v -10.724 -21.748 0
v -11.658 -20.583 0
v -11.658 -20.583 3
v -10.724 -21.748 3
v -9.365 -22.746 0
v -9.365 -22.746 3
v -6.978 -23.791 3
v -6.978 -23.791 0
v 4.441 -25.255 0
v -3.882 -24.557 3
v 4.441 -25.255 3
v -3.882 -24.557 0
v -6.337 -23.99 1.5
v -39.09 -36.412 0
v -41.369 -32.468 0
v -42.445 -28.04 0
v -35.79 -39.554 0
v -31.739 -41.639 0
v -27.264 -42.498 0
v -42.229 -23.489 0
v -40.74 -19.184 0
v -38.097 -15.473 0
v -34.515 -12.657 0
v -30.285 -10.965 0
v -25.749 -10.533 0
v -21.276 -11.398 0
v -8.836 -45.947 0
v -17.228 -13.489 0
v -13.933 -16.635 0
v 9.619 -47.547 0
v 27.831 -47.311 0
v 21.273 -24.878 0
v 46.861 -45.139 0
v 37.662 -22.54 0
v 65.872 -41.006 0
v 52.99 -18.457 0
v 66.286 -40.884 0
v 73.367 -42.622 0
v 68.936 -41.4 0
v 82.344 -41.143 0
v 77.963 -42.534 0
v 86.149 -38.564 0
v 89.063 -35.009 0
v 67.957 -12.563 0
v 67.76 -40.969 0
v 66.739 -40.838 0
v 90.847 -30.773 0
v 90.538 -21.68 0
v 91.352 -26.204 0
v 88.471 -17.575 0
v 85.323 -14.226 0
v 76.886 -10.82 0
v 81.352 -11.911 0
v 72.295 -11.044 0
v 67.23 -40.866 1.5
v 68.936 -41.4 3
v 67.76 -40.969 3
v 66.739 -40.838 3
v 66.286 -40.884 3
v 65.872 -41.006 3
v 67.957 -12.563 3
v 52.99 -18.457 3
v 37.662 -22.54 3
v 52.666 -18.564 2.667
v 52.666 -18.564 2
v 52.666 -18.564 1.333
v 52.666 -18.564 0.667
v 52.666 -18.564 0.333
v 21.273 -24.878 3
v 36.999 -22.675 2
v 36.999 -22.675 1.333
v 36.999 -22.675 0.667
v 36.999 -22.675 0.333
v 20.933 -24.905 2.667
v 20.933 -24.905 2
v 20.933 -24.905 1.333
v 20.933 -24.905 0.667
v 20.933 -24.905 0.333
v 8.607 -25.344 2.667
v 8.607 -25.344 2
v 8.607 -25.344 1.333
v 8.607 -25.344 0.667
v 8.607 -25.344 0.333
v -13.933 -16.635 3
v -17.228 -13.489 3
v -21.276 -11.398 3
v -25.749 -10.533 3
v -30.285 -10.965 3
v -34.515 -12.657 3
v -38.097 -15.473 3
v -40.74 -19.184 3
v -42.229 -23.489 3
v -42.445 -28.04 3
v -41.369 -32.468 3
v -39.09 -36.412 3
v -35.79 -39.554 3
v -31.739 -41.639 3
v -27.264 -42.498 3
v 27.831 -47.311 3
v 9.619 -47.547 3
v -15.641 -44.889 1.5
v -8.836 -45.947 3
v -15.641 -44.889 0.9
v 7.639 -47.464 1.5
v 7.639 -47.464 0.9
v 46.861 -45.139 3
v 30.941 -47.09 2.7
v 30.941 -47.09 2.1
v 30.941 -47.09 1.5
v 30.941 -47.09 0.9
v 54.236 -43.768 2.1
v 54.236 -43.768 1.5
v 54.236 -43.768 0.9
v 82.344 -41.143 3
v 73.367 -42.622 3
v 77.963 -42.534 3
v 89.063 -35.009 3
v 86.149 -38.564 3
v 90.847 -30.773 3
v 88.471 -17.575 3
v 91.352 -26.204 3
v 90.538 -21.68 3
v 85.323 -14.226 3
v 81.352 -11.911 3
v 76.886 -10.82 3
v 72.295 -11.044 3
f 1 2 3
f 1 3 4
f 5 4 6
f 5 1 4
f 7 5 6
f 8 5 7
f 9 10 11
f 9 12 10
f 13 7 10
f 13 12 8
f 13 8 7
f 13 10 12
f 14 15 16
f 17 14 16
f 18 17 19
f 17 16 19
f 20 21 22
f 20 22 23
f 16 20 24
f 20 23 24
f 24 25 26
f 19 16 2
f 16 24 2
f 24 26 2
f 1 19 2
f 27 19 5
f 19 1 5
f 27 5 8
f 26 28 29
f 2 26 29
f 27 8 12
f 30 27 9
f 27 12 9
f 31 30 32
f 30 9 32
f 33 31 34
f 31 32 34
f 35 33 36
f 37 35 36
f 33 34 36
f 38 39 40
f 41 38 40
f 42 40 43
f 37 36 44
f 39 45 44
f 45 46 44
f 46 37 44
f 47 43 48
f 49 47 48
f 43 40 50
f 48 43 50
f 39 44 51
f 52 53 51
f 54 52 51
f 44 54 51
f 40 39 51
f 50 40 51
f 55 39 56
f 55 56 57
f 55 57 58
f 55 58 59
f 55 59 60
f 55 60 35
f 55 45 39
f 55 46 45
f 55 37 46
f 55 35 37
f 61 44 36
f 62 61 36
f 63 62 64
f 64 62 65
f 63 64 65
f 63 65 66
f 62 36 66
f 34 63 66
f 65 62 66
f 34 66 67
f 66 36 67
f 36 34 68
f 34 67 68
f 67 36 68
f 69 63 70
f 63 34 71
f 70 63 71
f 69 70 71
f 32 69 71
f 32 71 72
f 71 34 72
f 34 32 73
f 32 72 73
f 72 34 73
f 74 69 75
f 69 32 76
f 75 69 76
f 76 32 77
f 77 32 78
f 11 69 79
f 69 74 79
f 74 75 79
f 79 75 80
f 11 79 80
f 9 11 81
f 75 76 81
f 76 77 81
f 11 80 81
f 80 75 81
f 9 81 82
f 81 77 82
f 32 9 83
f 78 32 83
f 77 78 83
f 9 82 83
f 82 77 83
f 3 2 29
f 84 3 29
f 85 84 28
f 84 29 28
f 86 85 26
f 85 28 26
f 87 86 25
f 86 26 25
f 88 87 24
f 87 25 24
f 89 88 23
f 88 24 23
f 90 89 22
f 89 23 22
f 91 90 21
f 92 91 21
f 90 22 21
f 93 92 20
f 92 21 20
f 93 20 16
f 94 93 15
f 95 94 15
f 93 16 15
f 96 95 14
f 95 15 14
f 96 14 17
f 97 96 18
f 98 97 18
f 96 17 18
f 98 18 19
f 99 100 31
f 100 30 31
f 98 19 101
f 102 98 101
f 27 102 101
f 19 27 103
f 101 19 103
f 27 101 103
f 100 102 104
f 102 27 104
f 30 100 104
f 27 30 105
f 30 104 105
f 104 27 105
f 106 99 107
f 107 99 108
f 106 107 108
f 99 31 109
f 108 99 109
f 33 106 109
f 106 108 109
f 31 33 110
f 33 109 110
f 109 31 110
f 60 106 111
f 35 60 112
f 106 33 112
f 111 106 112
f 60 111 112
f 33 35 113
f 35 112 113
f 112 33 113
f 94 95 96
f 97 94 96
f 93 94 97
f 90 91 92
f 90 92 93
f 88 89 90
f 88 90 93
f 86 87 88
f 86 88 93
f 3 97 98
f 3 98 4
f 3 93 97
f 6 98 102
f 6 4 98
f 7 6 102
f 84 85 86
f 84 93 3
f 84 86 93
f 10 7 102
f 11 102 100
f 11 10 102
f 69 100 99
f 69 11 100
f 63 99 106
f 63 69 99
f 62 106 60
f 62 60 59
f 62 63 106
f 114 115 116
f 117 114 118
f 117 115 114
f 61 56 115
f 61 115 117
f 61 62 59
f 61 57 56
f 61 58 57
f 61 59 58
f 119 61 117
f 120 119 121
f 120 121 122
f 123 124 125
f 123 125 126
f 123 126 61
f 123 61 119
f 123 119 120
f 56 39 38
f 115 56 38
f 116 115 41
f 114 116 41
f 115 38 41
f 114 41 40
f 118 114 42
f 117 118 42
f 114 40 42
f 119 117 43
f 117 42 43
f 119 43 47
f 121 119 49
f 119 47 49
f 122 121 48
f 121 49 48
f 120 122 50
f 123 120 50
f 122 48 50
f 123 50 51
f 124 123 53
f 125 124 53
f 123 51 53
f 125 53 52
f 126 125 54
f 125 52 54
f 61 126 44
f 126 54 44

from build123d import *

# Parameters (mm, degrees)
SKETCH1_R           = 5
SKETCH1_R_2         = 1.1
SKETCH1_R_3         = 4
BOSS_EXTRUDE1_DEPTH = 3


with BuildPart() as part:
    # Sketch1 → Boss-Extrude1 (new body)
    # profile 1 of 19: a face of its own
    with BuildSketch(Plane.XY):
        with BuildLine():
            ThreePointArc((68.935876888, -41.399946265), (91.352405248, -26.204284986), (67.957252813, -12.563327983))
            add(Edge.make_bspline(
                [(67.957252813, -12.563327983), (65.455609859, -13.713888582), (60.364787712, -15.882927404), (52.683559955, -18.641296662), (44.896066709, -20.933273776), (37.015370972, -22.752952432), (29.033864031, -24.103049266), (20.950849492, -24.983508442), (14.12359191, -25.325141054), (8.614596461, -25.364124484), (5.82883012, -25.303122311), (4.440642397, -25.254725163)],
                knots=[0.003418543, 0.003418543, 0.003418543, 0.003418543, 0.119867337, 0.236316132, 0.352764926, 0.46921372, 0.585662514, 0.702111309, 0.818560103, 0.8767845, 0.935008897, 0.935008897, 0.935008897, 0.935008897], degree=3))
            add(Edge.make_bspline(
                [(-11.658277887, -20.5832063), (-9.065688302, -25.060046308), (4.440642397, -25.254725163)],
                knots=[0, 0, 0, 1, 1, 1], degree=2))
            ThreePointArc((-11.658277887, -20.5832063), (-39.551034339, -17.233624375), (-27.264419704, -42.497524754))
            add(Edge.make_bspline(
                [(-27.264419704, -42.497524754), (-25.334460253, -42.955768201), (-21.452320642, -43.816124737), (-13.705385842, -45.286858174), (-4.006421964, -46.667533574), (7.638269658, -47.586831656), (19.289241844, -47.768762722), (30.941925955, -47.212824411), (42.591601286, -45.920000504), (52.298162816, -44.228522597), (60.052175742, -42.510146288), (63.940283625, -41.52535362), (65.871739475, -41.00572578)],
                knots=[0.004189422, 0.004189422, 0.004189422, 0.004189422, 0.066427583, 0.128665745, 0.253142067, 0.377618389, 0.502094711, 0.626571033, 0.751047356, 0.875523678, 0.937761839, 1, 1, 1, 1], degree=3))
            add(Edge.make_bspline(
                [(68.935876888, -41.399946265), (67.056778784, -40.529280178), (65.871739475, -41.00572578)],
                knots=[0, 0, 0, 1, 1, 1], degree=2))
        make_face()
        with Locations((75.361610976, -26.74696222)):
            Circle(SKETCH1_R, mode=Mode.SUBTRACT)
        with Locations((75.361610976, -18.74696222)):
            Circle(SKETCH1_R_2, mode=Mode.SUBTRACT)
        with Locations((81.018465226, -21.090107971)):
            Circle(SKETCH1_R_2, mode=Mode.SUBTRACT)
        with Locations((83.361610976, -26.74696222)):
            Circle(SKETCH1_R_2, mode=Mode.SUBTRACT)
        with Locations((-26.518107506, -26.514939916)):
            Circle(SKETCH1_R_3, mode=Mode.SUBTRACT)
        with Locations((81.018465226, -32.40381647)):
            Circle(SKETCH1_R_2, mode=Mode.SUBTRACT)
        with Locations((-26.516504294, -18.516504294)):
            Circle(SKETCH1_R_2, mode=Mode.SUBTRACT)
        with Locations((-20.859650045, -20.859650045)):
            Circle(SKETCH1_R_2, mode=Mode.SUBTRACT)
        with Locations((-18.516504294, -26.516504294)):
            Circle(SKETCH1_R_2, mode=Mode.SUBTRACT)
        with Locations((-20.859650045, -32.173358544)):
            Circle(SKETCH1_R_2, mode=Mode.SUBTRACT)
        with Locations((-26.516504294, -34.516504294)):
            Circle(SKETCH1_R_2, mode=Mode.SUBTRACT)
        with Locations((-32.173358544, -32.173358544)):
            Circle(SKETCH1_R_2, mode=Mode.SUBTRACT)
        with Locations((-34.516504294, -26.516504294)):
            Circle(SKETCH1_R_2, mode=Mode.SUBTRACT)
        with Locations((-32.173358544, -20.859650045)):
            Circle(SKETCH1_R_2, mode=Mode.SUBTRACT)
        with Locations((75.361610976, -34.74696222)):
            Circle(SKETCH1_R_2, mode=Mode.SUBTRACT)
        with Locations((69.704756727, -32.40381647)):
            Circle(SKETCH1_R_2, mode=Mode.SUBTRACT)
        with Locations((67.361610976, -26.74696222)):
            Circle(SKETCH1_R_2, mode=Mode.SUBTRACT)
        with Locations((69.704756727, -21.090107971)):
            Circle(SKETCH1_R_2, mode=Mode.SUBTRACT)
    # profile 2 of 19: a face of its own
    with BuildSketch(Plane.XY):
        with Locations((-20.859650045, -20.859650045)):
            Circle(SKETCH1_R_2)
    # profile 3 of 19: a face of its own
    with BuildSketch(Plane.XY):
        with Locations((-26.516504294, -18.516504294)):
            Circle(SKETCH1_R_2)
    # profile 4 of 19: a face of its own
    with BuildSketch(Plane.XY):
        with Locations((-32.173358544, -20.859650045)):
            Circle(SKETCH1_R_2)
    # profile 5 of 19: a face of its own
    with BuildSketch(Plane.XY):
        with Locations((-18.516504294, -26.516504294)):
            Circle(SKETCH1_R_2)
    # profile 6 of 19: a face of its own
    with BuildSketch(Plane.XY):
        with Locations((-20.859650045, -32.173358544)):
            Circle(SKETCH1_R_2)
    # profile 7 of 19: a face of its own
    with BuildSketch(Plane.XY):
        with Locations((-26.516504294, -34.516504294)):
            Circle(SKETCH1_R_2)
    # profile 8 of 19: a face of its own
    with BuildSketch(Plane.XY):
        with Locations((-32.173358544, -32.173358544)):
            Circle(SKETCH1_R_2)
    # profile 9 of 19: a face of its own
    with BuildSketch(Plane.XY):
        with Locations((-34.516504294, -26.516504294)):
            Circle(SKETCH1_R_2)
    # profile 10 of 19: a face of its own
    with BuildSketch(Plane.XY):
        with Locations((-26.518107506, -26.514939916)):
            Circle(SKETCH1_R_3)
    # profile 11 of 19: a face of its own
    with BuildSketch(Plane.XY):
        with Locations((83.361610976, -26.74696222)):
            Circle(SKETCH1_R_2)
    # profile 12 of 19: a face of its own
    with BuildSketch(Plane.XY):
        with Locations((81.018465226, -21.090107971)):
            Circle(SKETCH1_R_2)
    # profile 13 of 19: a face of its own
    with BuildSketch(Plane.XY):
        with Locations((75.361610976, -18.74696222)):
            Circle(SKETCH1_R_2)
    # profile 14 of 19: a face of its own
    with BuildSketch(Plane.XY):
        with Locations((69.704756727, -21.090107971)):
            Circle(SKETCH1_R_2)
    # profile 15 of 19: a face of its own
    with BuildSketch(Plane.XY):
        with Locations((67.361610976, -26.74696222)):
            Circle(SKETCH1_R_2)
    # profile 16 of 19: a face of its own
    with BuildSketch(Plane.XY):
        with Locations((69.704756727, -32.40381647)):
            Circle(SKETCH1_R_2)
    # profile 17 of 19: a face of its own
    with BuildSketch(Plane.XY):
        with Locations((75.361610976, -34.74696222)):
            Circle(SKETCH1_R_2)
    # profile 18 of 19: a face of its own
    with BuildSketch(Plane.XY):
        with Locations((81.018465226, -32.40381647)):
            Circle(SKETCH1_R_2)
    # profile 19 of 19: a face of its own
    with BuildSketch(Plane.XY):
        with Locations((75.361610976, -26.74696222)):
            Circle(SKETCH1_R)
    extrude(amount=BOSS_EXTRUDE1_DEPTH)


solid = part.part
